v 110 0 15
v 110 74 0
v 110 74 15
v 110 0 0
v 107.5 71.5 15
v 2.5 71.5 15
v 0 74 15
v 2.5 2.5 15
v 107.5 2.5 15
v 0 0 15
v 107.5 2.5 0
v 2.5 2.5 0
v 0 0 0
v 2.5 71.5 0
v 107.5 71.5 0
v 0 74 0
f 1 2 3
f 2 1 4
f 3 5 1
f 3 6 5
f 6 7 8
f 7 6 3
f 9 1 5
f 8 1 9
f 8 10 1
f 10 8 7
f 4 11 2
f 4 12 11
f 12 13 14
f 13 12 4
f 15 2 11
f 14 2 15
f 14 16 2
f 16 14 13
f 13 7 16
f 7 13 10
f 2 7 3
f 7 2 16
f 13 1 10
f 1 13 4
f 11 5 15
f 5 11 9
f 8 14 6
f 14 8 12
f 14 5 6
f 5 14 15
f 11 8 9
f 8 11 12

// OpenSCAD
// file: ../../00_common/parameters.scad
// =============================================================================
// OpenMotorBridge - Global CAD Parameters & Settings
// =============================================================================
// File: hardware/cad/scad/00_common/parameters.scad
// Description: Global dimensional constants, manufacturing clearances and
//              circle resolution ($fn) for all OpenSCAD modules.
// =============================================================================

// --- 1. Circle & Curve Resolution ---
$fn = 60; // Smooth cylinders and holes for high-quality MJF 3D printing

// --- 2. Central Main Box Dimensions (3-Tier Sandwich) ---
MAIN_BOX_OUTER_L      = 110.0; // Outer length in X (mm)
MAIN_BOX_OUTER_W      = 74.0;  // Outer width in Y (mm)
MAIN_BOX_LOWER_H      = 17.0;  // Lower case height in Z (mm)
MAIN_BOX_MID_H        = 15.0;  // Mid tray height in Z (mm)
MAIN_BOX_LID_H        = 4.0;   // Lid plate thickness in Z (mm)
MAIN_BOX_WALL         = 2.5;   // Nominal wall thickness (mm)
MAIN_BOX_CORNER_POST  = 5.0;   // Corner clamping screw post size (mm)

// --- 3. Satellite Pod Dimensions (Universal 1-Pod Housing) ---
POD_OUTER_L           = 100.0; // Outer length in X (mm)
POD_OUTER_W           = 60.0;  // Outer width in Y (mm)
POD_OUTER_H           = 28.0;  // Outer height in Z (mm)
POD_WALL              = 2.5;   // Nominal wall thickness (mm)
POD_BULKHEAD_X        = 22.0;  // Partition bulkhead position in X (mm)
POD_CHAMBER_L         = 78.0;  // Sliding chamber length in X (mm)
POD_CHAMBER_W         = 55.0;  // Sliding chamber width in Y (mm)
POD_CHAMBER_H         = 23.0;  // Sliding chamber height in Z (mm)

// --- 4. Pod Linear Guide Rails (Poka-Yoke Tongue & Groove) ---
POD_GROOVE_W          = 3.0;   // Internal guide groove width in Z (mm)
POD_GROOVE_DEPTH      = 1.5;   // Internal guide groove depth in Y (mm)
POD_GROOVE_LEFT_Z     = 8.2;   // Center height of left groove (mm)
POD_GROOVE_RIGHT_Z    = 14.2;  // Center height of right groove (mm, asym offset)

CARTRIDGE_TONGUE_W    = 2.6;   // Cartridge tongue rail height in Z (mm, 0.2mm clearance)
CARTRIDGE_TONGUE_PROT = 1.4;   // Cartridge tongue protrusion in Y (mm, 0.1mm clearance)
CARTRIDGE_CHAMFER_L   = 4.0;   // 30° lead-in chamfer nose length (mm)

// --- 5. Cartridge Dimensions ---
CARTRIDGE_BASE_L      = 75.0;  // Sled length in X (mm)
CARTRIDGE_BASE_W      = 54.0;  // Sled width in Y (mm)
CARTRIDGE_BASE_H      = 20.5;  // Sled height in Z (mm)
CARTRIDGE_FACE_L      = 4.0;   // Front faceplate thickness in X (mm)
CARTRIDGE_FACE_W      = 58.0;  // Front faceplate width in Y (mm)
CARTRIDGE_FACE_H      = 25.0;  // Front faceplate height in Z (mm)

// --- 6. Thermal Copper Studs (Kühlbolzen) ---
COPPER_STUD_DIA       = 8.0;   // Diameter of thermal copper studs (mm)
COPPER_STUD_R         = COPPER_STUD_DIA / 2.0; // Radius = 4.0 mm

// Main Box Thermal Stud Positions (4x in lower case floor)
MAIN_BOX_CU_POS = [
    [35.0, 25.0], // Position 1 (LM5164 DCDC Buck Regulator)
    [45.0, 25.0], // Position 2 (BQ25798 LiPo Charger)
    [30.0, 48.0], // Position 3 (ESP32-S3 Dual-Core SoC)
    [70.0, 40.0]  // Position 4 (Automotive TVS & LC Filter Zone)
];

// Pod & Cartridge Thermal Stud Positions (2x in floor)
POD_CU_POS = [
    [42.0, 30.0], // Forward thermal zone
    [72.0, 30.0]  // Rearward thermal zone
];

// --- 7. Screw & Clearance Dimensions ---
M2_SCREW_HOLE_R       = 1.1;   // M2 clearance hole (r = 1.1 mm -> Ø 2.2 mm)
M2_5_SCREW_HOLE_R     = 1.4;   // M2.5 clearance hole (r = 1.4 mm -> Ø 2.8 mm)
M3_SCREW_HOLE_R       = 1.65;  // M3 clearance hole (r = 1.65 mm -> Ø 3.3 mm)
M4_SCREW_HOLE_R       = 2.2;   // M4 clearance hole (r = 2.2 mm -> Ø 4.4 mm)
M8_BORE_R             = 4.0;   // M8 cable through-bore (r = 4.0 mm -> Ø 8.0 mm)
M8_STUDS_OUTER_R      = 6.0;   // M8 neck outer radius (Ø 12.0 mm)
// main file
// =============================================================================
// OpenMotorBridge - Main Box: Mid Tray Frame (Oberwannen-Rahmen)
// =============================================================================
// File: hardware/cad/scad/01_main_box/parts/010_mid_tray_frame.scad
// =============================================================================

include <../../00_common/parameters.scad>;

module main_box_mid_tray_frame(length=110.0, width=74.0, height=15.0, wall=2.5) {
    difference() {
        // Outer solid block
        cube(size=[length, width, height], center=false);
        // Hollow interior (open top and bottom for partition plate insertion)
        translate([wall, wall, -0.1])
            cube(size=[length - 2*wall, width - 2*wall, height + 0.2], center=false);
    }
}

// Standalone preview
main_box_mid_tray_frame();
